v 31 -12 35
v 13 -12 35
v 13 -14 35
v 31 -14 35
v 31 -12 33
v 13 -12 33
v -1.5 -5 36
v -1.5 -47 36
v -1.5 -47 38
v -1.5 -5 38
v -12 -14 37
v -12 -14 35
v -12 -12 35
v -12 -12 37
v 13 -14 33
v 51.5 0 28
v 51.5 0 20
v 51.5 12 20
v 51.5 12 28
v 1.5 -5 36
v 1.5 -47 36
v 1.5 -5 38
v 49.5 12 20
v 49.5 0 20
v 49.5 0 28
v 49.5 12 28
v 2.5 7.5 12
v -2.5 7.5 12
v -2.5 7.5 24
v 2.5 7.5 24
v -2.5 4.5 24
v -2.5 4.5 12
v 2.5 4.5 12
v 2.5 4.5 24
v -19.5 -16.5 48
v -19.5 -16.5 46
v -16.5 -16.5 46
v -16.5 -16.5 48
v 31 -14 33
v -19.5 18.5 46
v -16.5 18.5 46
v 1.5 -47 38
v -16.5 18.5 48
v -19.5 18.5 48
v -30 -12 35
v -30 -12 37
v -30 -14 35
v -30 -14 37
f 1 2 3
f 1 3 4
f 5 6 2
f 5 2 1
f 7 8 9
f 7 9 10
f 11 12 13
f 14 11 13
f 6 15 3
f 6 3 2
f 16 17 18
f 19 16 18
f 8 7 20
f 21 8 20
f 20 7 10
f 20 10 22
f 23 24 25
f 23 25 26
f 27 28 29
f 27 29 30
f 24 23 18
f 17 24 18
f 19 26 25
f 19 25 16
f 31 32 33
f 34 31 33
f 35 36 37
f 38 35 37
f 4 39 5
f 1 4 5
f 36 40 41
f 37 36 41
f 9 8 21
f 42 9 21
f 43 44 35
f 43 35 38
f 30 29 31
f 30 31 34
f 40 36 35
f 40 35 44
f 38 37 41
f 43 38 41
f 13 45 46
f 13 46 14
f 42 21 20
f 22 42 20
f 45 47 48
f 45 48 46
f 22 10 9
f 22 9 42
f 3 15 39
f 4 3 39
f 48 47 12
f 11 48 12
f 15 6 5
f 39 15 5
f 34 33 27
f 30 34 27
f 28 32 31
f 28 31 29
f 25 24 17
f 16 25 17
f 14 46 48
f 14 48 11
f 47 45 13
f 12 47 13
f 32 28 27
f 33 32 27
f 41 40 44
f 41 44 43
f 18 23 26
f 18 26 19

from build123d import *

# Parameters (mm, degrees)
SENSOR_START                                = 36
SKETCH_1_W                                  = 3
SKETCH_1_H                                  = 42
SENSOR_CABLE_HC_SR04_TO_ESP32_DEPTH         = 2
SERVO_START                                 = 46
SKETCH_2_W                                  = 3
SKETCH_2_H                                  = 35
SERVO_PWM_CABLE_SG90_TO_ESP32_DEPTH         = 2
LED_START                                   = 35
SKETCH_3_W                                  = 18
SKETCH_3_H                                  = 2
LED_DATA_CABLE_WS2812_TO_ESP32_DEPTH        = 2
BUZZER_START                                = 33
SKETCH_4_W                                  = 18
SKETCH_4_H                                  = 2
BUZZER_SIGNAL_CABLE_BUZZER_TO_ESP32_DEPTH   = 2
F_5V_START                                  = 12
SKETCH_5_W                                  = 5
SKETCH_5_H                                  = 3
F_5V_POWER_LEADS_BATTERY_TO_MAIN_RAIL_DEPTH = 12
USB_START                                   = 20
SKETCH_6_W                                  = 2
SKETCH_6_H                                  = 12
USB_SIDE_EXIT_CLEARANCE_MARKER_DEPTH        = 8


with BuildPart() as part:
    # 草图1 → sensor cable: HC-SR04 to ESP32 (new body)
    with BuildSketch(Plane.XY.offset(SENSOR_START)):
        with Locations((0, -26)):
            Rectangle(SKETCH_1_W, SKETCH_1_H)
    extrude(amount=SENSOR_CABLE_HC_SR04_TO_ESP32_DEPTH)


with BuildPart() as body_2:
    # 草图2 → servo PWM cable: SG90 to ESP32 (new body)
    with BuildSketch(Plane.XY.offset(SERVO_START)):
        with Locations((-18, 1)):
            Rectangle(SKETCH_2_W, SKETCH_2_H)
    extrude(amount=SERVO_PWM_CABLE_SG90_TO_ESP32_DEPTH)


with BuildPart() as body_3:
    # 草图3 → LED data cable: WS2812 to ESP32 (new body)
    with BuildSketch(Plane.XY.offset(LED_START)):
        with Locations((-21, -13)):
            Rectangle(SKETCH_3_W, SKETCH_3_H)
    extrude(amount=LED_DATA_CABLE_WS2812_TO_ESP32_DEPTH)


with BuildPart() as body_4:
    # 草图4 → buzzer signal cable: buzzer to ESP32 (new body)
    with BuildSketch(Plane.XY.offset(BUZZER_START)):
        with Locations((22, -13)):
            Rectangle(SKETCH_4_W, SKETCH_4_H)
    extrude(amount=BUZZER_SIGNAL_CABLE_BUZZER_TO_ESP32_DEPTH)


with BuildPart() as body_5:
    # 草图5 → 5V power leads: battery to main rail (new body)
    with BuildSketch(Plane.XY.offset(F_5V_START)):
        with Locations((0, 6)):
            Rectangle(SKETCH_5_W, SKETCH_5_H)
    extrude(amount=F_5V_POWER_LEADS_BATTERY_TO_MAIN_RAIL_DEPTH)


with BuildPart() as body_6:
    # 草图6 → USB side exit clearance marker (new body)
    with BuildSketch(Plane.XY.offset(USB_START)):
        with Locations((50.5, 6)):
            Rectangle(SKETCH_6_W, SKETCH_6_H)
    extrude(amount=USB_SIDE_EXIT_CLEARANCE_MARKER_DEPTH)


solid = Compound([part.part, body_2.part, body_3.part, body_4.part, body_5.part, body_6.part])
